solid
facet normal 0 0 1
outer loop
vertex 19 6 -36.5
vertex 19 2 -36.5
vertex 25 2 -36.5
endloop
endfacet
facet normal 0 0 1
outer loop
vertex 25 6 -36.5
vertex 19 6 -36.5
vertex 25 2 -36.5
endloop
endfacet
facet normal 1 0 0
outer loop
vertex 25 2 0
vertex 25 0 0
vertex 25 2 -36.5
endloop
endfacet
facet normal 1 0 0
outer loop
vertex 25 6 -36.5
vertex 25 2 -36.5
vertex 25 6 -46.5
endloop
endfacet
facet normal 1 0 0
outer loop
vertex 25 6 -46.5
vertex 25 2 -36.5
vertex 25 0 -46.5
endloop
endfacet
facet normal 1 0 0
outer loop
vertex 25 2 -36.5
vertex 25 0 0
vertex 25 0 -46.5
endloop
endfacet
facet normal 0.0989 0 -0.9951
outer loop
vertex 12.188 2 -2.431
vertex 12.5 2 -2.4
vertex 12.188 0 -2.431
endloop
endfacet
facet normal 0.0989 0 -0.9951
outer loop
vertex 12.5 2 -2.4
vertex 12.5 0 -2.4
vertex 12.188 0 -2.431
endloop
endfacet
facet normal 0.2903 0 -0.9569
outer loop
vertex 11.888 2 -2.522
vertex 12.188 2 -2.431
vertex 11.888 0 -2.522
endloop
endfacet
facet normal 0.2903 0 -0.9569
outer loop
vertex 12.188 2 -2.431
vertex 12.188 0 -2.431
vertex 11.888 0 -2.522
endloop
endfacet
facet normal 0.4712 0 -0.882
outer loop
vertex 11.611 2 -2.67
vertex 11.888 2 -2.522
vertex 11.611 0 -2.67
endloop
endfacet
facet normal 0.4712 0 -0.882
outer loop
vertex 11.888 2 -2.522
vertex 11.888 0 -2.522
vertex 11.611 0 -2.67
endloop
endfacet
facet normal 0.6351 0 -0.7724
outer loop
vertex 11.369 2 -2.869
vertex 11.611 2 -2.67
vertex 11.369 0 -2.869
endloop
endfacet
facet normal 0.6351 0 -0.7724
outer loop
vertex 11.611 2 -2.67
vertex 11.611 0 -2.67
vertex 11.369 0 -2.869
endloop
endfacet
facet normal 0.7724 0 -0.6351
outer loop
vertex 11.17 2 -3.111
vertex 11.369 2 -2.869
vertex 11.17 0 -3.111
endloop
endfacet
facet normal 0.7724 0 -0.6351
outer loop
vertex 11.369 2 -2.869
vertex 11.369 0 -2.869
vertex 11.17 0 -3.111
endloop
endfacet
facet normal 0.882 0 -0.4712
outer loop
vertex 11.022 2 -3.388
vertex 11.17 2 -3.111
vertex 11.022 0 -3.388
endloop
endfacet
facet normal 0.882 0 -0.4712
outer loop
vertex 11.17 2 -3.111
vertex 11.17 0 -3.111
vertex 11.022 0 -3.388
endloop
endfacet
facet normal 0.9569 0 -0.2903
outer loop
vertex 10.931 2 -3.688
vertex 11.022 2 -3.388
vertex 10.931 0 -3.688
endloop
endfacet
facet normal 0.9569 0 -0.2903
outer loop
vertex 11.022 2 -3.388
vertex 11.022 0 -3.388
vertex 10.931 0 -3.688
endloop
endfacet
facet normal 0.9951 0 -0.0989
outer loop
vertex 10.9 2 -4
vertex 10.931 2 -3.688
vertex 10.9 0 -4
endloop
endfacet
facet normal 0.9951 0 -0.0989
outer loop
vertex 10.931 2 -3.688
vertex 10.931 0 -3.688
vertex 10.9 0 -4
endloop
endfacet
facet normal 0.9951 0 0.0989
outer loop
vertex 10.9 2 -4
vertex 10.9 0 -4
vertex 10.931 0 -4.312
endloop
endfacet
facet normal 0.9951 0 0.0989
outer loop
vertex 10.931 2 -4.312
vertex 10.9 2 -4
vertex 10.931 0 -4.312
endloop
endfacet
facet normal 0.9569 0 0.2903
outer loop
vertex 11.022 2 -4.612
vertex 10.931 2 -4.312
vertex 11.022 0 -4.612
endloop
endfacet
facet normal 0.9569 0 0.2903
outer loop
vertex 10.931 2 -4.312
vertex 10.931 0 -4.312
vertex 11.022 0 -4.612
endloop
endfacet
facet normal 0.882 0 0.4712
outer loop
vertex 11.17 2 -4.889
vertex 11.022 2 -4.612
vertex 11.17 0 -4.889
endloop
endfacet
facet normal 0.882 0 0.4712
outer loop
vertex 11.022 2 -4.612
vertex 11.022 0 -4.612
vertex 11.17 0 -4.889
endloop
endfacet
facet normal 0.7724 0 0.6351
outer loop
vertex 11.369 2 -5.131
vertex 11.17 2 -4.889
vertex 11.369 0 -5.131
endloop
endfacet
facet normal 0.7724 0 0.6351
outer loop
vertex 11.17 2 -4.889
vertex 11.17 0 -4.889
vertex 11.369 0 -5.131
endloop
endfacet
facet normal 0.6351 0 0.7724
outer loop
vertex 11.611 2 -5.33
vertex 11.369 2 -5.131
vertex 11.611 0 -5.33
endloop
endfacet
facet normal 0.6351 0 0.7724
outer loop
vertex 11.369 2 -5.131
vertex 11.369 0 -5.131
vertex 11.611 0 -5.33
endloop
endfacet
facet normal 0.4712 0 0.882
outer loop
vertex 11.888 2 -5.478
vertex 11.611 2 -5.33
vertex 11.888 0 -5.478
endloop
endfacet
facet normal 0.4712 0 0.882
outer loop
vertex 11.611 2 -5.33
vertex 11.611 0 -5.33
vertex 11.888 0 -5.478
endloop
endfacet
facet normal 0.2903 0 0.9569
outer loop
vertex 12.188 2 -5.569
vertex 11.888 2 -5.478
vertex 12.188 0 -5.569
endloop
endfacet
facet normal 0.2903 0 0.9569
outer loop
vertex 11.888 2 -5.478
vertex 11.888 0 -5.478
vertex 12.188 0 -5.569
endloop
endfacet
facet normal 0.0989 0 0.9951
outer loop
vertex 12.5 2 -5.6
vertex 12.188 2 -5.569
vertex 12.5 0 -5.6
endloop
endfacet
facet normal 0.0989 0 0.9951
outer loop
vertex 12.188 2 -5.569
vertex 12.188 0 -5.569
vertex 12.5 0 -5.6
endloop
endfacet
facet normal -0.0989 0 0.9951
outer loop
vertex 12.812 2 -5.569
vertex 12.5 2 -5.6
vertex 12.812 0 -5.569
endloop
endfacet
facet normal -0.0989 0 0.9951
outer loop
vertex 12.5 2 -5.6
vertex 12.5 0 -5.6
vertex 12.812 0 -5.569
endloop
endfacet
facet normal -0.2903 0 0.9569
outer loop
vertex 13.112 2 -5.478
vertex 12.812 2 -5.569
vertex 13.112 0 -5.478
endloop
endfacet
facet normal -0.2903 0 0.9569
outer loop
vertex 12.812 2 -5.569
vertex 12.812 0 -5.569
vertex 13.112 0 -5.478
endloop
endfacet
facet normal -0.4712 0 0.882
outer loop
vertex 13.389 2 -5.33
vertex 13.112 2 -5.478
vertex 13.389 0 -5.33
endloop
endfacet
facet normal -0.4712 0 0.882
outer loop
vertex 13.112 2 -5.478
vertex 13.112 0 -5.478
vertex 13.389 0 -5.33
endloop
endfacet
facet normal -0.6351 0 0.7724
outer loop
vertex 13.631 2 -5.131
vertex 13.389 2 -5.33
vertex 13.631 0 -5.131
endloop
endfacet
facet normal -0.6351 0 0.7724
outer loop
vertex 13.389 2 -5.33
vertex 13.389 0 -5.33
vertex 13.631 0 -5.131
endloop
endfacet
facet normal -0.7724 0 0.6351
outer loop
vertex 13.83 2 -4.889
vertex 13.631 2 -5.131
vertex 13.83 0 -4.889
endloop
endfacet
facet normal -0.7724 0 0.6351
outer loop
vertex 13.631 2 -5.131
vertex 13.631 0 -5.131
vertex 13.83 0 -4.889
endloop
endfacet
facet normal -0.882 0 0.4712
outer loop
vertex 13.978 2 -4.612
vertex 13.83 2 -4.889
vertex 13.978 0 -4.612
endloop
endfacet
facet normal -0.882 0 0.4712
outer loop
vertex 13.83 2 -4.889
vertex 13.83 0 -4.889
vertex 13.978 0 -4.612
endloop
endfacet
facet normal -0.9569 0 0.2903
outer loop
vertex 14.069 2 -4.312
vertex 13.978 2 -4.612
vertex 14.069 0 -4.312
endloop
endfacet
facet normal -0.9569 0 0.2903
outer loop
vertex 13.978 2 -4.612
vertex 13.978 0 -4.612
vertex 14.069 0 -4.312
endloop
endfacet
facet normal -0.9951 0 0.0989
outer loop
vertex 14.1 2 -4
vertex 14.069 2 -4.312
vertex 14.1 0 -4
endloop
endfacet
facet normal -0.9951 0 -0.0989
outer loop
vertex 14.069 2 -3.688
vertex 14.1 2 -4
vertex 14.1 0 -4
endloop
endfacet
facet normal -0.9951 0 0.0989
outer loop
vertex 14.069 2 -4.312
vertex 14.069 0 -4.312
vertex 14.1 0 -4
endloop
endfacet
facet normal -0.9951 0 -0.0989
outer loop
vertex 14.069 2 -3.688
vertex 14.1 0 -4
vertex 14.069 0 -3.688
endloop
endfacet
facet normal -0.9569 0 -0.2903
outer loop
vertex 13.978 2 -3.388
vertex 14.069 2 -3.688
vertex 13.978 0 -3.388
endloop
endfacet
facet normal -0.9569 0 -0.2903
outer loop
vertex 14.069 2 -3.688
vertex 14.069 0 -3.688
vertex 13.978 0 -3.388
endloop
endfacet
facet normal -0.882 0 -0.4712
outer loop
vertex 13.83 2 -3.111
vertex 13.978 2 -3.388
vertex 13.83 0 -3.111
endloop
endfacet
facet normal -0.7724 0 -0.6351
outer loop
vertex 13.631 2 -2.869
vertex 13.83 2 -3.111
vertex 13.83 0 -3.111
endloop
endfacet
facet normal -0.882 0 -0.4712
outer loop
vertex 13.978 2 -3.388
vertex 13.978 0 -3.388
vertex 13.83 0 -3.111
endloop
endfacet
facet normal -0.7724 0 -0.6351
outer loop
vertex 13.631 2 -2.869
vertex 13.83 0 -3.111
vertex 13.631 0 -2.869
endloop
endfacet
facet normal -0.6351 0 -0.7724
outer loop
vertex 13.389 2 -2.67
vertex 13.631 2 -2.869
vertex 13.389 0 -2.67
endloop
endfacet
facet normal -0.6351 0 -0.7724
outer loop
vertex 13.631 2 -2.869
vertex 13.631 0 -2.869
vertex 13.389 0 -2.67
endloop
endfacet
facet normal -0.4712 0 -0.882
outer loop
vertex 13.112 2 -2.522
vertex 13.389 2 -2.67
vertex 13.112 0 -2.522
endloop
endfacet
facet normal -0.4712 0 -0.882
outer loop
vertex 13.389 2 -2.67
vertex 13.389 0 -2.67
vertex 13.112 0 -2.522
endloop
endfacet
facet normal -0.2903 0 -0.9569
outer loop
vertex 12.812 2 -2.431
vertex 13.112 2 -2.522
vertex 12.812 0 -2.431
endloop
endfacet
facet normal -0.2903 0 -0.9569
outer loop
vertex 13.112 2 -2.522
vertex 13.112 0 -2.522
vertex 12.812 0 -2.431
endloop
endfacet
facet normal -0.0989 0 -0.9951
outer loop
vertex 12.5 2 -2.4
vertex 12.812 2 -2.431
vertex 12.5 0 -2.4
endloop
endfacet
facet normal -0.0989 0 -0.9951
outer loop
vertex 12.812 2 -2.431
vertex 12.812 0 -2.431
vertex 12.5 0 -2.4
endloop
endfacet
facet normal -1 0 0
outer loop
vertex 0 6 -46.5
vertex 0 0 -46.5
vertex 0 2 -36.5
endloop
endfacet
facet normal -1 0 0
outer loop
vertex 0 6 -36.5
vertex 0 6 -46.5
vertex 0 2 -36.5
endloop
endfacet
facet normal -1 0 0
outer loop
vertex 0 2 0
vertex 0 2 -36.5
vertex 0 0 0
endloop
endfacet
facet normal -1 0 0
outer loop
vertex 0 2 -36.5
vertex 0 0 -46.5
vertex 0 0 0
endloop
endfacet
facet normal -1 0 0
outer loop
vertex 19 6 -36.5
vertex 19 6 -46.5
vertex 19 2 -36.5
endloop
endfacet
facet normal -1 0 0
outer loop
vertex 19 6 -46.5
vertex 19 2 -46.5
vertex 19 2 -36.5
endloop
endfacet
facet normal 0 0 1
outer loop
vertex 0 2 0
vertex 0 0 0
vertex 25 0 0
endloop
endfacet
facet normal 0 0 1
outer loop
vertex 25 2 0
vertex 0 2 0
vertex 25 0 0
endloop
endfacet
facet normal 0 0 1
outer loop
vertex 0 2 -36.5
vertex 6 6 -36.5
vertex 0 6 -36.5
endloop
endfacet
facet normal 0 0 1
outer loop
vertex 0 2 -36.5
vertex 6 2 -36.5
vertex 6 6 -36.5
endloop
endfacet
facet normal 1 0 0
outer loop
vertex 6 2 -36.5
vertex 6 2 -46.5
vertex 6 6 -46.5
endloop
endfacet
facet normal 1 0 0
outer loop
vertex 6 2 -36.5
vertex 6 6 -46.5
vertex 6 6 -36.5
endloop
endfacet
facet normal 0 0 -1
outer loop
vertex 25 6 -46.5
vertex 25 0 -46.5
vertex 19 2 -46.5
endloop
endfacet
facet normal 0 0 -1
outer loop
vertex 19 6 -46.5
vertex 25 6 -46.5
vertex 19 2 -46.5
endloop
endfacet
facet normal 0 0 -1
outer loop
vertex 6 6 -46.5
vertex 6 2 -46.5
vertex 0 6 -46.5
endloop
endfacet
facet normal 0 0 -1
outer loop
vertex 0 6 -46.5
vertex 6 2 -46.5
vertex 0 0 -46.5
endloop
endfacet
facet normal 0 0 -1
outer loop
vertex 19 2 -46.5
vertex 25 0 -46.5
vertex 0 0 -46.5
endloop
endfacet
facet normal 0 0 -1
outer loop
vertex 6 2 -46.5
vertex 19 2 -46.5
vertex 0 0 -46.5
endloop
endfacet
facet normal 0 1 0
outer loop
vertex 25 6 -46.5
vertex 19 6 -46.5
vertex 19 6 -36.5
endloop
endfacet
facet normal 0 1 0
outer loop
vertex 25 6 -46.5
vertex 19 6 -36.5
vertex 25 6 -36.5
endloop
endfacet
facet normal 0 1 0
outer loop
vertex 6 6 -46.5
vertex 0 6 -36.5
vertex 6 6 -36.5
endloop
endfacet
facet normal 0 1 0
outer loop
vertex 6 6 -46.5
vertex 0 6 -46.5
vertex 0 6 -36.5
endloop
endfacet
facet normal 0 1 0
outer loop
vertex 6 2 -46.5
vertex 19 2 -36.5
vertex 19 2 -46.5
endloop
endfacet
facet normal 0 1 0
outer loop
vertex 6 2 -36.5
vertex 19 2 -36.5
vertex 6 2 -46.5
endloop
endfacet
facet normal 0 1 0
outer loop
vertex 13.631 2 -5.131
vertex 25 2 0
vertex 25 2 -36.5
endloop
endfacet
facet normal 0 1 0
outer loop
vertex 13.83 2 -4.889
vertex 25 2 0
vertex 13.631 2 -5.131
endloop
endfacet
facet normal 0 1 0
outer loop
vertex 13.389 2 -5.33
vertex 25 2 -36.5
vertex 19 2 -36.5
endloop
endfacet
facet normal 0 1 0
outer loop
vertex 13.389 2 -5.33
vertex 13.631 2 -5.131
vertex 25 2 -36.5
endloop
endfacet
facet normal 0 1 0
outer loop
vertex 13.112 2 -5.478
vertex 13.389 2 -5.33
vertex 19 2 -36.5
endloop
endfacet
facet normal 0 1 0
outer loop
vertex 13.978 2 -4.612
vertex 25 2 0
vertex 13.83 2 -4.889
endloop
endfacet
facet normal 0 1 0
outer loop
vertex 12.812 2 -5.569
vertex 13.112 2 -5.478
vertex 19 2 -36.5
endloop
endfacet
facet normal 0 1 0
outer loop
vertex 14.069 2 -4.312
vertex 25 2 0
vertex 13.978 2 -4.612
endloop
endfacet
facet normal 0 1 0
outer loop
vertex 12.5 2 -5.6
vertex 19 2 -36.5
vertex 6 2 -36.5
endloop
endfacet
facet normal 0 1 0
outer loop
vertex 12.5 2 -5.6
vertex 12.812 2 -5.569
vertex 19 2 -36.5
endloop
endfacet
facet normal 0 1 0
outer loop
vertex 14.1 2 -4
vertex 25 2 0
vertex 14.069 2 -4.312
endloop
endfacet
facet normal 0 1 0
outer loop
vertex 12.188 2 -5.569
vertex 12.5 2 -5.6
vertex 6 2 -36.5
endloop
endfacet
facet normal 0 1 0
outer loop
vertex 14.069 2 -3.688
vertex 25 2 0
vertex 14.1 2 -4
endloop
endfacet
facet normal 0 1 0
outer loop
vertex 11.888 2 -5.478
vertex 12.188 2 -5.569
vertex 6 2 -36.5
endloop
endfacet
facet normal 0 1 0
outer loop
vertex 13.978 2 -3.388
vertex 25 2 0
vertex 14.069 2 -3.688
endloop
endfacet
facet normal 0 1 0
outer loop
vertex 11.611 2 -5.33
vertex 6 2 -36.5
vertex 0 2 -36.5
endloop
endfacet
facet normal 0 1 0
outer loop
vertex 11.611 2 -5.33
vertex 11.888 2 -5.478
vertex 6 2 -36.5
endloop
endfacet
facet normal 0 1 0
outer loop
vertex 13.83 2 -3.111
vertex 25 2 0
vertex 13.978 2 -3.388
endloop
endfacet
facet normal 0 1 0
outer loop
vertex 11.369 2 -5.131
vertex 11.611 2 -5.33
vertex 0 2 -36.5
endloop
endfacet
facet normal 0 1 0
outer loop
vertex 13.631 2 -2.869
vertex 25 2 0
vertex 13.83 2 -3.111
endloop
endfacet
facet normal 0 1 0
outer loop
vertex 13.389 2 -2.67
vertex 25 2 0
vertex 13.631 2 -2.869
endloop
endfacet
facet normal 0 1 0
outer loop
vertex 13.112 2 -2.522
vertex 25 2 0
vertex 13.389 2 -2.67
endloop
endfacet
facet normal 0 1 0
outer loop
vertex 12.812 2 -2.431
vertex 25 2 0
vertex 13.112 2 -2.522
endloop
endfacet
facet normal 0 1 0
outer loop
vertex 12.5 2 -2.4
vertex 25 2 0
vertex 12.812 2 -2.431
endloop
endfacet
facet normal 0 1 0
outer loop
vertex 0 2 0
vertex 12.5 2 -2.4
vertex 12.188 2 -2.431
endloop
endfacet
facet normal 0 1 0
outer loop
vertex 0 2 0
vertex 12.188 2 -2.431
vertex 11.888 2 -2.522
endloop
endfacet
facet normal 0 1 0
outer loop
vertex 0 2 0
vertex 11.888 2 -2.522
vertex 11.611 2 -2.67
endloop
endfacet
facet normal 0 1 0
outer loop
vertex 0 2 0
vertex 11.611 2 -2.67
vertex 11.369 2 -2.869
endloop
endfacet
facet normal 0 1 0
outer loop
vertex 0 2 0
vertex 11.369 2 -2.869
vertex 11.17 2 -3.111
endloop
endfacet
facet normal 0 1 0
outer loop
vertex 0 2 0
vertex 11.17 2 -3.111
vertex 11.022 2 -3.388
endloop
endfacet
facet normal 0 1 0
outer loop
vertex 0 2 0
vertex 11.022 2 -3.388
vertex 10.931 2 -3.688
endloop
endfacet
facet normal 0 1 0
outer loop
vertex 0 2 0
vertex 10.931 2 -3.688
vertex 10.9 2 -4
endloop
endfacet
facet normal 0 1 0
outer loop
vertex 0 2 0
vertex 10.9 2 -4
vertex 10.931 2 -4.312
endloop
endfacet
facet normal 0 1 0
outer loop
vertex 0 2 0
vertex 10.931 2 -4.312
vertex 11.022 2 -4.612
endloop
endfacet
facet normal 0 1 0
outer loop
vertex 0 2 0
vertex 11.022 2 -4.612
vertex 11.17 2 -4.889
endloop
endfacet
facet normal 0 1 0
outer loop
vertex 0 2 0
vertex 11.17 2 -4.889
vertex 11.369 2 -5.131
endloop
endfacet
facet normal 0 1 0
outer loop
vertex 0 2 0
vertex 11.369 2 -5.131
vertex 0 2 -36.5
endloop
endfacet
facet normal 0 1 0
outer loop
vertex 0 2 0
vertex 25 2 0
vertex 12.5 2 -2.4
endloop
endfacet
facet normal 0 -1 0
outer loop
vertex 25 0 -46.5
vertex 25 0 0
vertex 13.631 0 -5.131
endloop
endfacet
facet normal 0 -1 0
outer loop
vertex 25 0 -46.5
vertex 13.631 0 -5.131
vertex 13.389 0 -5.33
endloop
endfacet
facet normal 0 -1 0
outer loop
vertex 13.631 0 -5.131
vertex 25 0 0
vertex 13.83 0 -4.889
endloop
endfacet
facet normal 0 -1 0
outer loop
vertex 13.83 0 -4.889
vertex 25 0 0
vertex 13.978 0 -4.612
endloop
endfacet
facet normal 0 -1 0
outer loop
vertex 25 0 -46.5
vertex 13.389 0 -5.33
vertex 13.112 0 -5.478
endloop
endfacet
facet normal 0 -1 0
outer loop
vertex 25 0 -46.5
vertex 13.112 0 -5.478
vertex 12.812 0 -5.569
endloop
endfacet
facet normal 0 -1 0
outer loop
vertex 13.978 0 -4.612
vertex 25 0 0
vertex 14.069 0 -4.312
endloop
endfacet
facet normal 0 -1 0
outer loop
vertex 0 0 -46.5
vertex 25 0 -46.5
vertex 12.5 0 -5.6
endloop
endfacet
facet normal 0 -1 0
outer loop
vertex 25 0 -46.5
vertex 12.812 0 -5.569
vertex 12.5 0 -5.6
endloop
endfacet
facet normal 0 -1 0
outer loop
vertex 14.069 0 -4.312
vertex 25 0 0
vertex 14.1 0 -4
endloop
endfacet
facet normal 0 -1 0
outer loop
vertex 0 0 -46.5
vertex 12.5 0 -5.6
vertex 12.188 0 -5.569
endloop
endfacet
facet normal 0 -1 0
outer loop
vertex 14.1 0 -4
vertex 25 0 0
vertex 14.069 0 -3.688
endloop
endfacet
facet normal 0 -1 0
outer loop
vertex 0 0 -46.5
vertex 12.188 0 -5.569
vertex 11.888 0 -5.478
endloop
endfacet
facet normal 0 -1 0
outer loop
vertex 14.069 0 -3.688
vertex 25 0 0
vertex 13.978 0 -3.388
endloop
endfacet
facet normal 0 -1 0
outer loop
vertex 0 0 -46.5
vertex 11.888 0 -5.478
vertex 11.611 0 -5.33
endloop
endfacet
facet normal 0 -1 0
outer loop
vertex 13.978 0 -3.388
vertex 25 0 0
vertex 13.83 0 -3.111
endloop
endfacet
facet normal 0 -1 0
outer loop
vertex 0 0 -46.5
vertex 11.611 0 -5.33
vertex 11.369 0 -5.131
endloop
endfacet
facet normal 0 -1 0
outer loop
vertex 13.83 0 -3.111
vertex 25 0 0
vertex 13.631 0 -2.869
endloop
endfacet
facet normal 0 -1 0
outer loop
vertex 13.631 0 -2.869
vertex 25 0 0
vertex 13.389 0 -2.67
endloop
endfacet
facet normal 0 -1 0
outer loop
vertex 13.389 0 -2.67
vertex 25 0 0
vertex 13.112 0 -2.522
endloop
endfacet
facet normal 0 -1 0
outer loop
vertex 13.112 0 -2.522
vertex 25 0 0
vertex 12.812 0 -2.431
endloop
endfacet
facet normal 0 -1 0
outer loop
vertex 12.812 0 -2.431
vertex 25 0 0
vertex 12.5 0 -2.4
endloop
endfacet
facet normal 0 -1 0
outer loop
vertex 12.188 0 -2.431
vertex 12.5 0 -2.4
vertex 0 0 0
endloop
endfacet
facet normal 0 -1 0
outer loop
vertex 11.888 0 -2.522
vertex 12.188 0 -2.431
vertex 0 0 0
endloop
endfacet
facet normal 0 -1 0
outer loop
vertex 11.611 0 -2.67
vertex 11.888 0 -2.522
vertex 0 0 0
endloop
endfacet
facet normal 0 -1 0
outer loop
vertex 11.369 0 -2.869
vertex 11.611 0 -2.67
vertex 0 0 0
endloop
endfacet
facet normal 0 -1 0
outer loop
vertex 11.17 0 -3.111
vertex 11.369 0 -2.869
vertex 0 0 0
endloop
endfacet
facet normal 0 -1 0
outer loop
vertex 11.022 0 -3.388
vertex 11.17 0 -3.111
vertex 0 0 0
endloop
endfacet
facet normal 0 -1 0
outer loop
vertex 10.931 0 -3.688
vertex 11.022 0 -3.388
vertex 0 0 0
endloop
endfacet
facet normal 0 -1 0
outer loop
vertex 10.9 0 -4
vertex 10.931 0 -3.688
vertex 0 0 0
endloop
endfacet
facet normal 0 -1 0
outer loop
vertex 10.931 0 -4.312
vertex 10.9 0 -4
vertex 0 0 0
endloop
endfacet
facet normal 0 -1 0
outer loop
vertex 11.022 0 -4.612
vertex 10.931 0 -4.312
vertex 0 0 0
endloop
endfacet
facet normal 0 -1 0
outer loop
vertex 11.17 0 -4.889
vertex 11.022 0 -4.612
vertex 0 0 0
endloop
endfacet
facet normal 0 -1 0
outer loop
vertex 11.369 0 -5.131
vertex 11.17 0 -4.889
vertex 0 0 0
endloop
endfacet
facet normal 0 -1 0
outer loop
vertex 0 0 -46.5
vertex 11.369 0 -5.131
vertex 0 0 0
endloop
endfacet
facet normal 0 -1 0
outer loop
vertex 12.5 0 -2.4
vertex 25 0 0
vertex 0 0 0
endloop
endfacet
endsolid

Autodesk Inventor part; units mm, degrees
ref_plane "YZ Plane" through (0, 0, 0) normal (1, 0, 0) x (0, 1, 0)
ref_plane "XZ Plane" through (0, 0, 0) normal (0, 1, 0) x (-1, 0, 0)
ref_plane "XY Plane" through (0, 0, 0) normal (0, 0, 1) x (1, 0, 0)
sketch "Sketch1" plane through (0, 0, 0) normal (0, 1, 0) x (-1, 0, 0)
  line L0 (0, 0) -> (-25, 0)
  line L1 (-25, 0) -> (-25, -46.5)
  line L2 (-25, -46.5) -> (0, -46.5)
  line L3 (0, -46.5) -> (0, 0)
  dimension "d0" = 25
  dimension "d1" = 46.5
extrude "Extrusion1" add sketch "Sketch1" along normal blind 2
sketch "Sketch2" plane through (0, 2, 0) normal (0, 1, 0) x (1, 0, 0)
  line L0 (25, 46.5) -> (0, 46.5) projected
  line L1 (0, 46.5) -> (6, 46.5)
  line L2 (6, 46.5) -> (6, 36.5)
  line L3 (6, 36.5) -> (0, 36.5)
  line L4 (0, 36.5) -> (0, 46.5)
  line L5 (25, 46.5) -> (19, 46.5)
  line L6 (19, 46.5) -> (19, 36.5)
  line L7 (19, 36.5) -> (25, 36.5)
  line L8 (25, 36.5) -> (25, 46.5)
  point P0 (0, 0)
  dimension "d4" = 6
  dimension "d5" = 10
  dimension "d6" = 6
extrude "Extrusion2" add sketch "Sketch2" along normal blind 4
sketch "Sketch4" plane through (0, 2, 0) normal (0, 1, 0) x (1, 0, 0)
  line L0 (0, 0) -> (25, 0) projected
  line L1 (25, 0) -> (25, 36.5) projected
  point P0 (12.5, 4)
  dimension "d18" = 4
  dimension "d19" = 12.5
hole "Hole2" at (12.5, 2, -4) direction (0, -1, 0) diameter 3.2 end through all
properties part number "mlx_mount_4mm"
